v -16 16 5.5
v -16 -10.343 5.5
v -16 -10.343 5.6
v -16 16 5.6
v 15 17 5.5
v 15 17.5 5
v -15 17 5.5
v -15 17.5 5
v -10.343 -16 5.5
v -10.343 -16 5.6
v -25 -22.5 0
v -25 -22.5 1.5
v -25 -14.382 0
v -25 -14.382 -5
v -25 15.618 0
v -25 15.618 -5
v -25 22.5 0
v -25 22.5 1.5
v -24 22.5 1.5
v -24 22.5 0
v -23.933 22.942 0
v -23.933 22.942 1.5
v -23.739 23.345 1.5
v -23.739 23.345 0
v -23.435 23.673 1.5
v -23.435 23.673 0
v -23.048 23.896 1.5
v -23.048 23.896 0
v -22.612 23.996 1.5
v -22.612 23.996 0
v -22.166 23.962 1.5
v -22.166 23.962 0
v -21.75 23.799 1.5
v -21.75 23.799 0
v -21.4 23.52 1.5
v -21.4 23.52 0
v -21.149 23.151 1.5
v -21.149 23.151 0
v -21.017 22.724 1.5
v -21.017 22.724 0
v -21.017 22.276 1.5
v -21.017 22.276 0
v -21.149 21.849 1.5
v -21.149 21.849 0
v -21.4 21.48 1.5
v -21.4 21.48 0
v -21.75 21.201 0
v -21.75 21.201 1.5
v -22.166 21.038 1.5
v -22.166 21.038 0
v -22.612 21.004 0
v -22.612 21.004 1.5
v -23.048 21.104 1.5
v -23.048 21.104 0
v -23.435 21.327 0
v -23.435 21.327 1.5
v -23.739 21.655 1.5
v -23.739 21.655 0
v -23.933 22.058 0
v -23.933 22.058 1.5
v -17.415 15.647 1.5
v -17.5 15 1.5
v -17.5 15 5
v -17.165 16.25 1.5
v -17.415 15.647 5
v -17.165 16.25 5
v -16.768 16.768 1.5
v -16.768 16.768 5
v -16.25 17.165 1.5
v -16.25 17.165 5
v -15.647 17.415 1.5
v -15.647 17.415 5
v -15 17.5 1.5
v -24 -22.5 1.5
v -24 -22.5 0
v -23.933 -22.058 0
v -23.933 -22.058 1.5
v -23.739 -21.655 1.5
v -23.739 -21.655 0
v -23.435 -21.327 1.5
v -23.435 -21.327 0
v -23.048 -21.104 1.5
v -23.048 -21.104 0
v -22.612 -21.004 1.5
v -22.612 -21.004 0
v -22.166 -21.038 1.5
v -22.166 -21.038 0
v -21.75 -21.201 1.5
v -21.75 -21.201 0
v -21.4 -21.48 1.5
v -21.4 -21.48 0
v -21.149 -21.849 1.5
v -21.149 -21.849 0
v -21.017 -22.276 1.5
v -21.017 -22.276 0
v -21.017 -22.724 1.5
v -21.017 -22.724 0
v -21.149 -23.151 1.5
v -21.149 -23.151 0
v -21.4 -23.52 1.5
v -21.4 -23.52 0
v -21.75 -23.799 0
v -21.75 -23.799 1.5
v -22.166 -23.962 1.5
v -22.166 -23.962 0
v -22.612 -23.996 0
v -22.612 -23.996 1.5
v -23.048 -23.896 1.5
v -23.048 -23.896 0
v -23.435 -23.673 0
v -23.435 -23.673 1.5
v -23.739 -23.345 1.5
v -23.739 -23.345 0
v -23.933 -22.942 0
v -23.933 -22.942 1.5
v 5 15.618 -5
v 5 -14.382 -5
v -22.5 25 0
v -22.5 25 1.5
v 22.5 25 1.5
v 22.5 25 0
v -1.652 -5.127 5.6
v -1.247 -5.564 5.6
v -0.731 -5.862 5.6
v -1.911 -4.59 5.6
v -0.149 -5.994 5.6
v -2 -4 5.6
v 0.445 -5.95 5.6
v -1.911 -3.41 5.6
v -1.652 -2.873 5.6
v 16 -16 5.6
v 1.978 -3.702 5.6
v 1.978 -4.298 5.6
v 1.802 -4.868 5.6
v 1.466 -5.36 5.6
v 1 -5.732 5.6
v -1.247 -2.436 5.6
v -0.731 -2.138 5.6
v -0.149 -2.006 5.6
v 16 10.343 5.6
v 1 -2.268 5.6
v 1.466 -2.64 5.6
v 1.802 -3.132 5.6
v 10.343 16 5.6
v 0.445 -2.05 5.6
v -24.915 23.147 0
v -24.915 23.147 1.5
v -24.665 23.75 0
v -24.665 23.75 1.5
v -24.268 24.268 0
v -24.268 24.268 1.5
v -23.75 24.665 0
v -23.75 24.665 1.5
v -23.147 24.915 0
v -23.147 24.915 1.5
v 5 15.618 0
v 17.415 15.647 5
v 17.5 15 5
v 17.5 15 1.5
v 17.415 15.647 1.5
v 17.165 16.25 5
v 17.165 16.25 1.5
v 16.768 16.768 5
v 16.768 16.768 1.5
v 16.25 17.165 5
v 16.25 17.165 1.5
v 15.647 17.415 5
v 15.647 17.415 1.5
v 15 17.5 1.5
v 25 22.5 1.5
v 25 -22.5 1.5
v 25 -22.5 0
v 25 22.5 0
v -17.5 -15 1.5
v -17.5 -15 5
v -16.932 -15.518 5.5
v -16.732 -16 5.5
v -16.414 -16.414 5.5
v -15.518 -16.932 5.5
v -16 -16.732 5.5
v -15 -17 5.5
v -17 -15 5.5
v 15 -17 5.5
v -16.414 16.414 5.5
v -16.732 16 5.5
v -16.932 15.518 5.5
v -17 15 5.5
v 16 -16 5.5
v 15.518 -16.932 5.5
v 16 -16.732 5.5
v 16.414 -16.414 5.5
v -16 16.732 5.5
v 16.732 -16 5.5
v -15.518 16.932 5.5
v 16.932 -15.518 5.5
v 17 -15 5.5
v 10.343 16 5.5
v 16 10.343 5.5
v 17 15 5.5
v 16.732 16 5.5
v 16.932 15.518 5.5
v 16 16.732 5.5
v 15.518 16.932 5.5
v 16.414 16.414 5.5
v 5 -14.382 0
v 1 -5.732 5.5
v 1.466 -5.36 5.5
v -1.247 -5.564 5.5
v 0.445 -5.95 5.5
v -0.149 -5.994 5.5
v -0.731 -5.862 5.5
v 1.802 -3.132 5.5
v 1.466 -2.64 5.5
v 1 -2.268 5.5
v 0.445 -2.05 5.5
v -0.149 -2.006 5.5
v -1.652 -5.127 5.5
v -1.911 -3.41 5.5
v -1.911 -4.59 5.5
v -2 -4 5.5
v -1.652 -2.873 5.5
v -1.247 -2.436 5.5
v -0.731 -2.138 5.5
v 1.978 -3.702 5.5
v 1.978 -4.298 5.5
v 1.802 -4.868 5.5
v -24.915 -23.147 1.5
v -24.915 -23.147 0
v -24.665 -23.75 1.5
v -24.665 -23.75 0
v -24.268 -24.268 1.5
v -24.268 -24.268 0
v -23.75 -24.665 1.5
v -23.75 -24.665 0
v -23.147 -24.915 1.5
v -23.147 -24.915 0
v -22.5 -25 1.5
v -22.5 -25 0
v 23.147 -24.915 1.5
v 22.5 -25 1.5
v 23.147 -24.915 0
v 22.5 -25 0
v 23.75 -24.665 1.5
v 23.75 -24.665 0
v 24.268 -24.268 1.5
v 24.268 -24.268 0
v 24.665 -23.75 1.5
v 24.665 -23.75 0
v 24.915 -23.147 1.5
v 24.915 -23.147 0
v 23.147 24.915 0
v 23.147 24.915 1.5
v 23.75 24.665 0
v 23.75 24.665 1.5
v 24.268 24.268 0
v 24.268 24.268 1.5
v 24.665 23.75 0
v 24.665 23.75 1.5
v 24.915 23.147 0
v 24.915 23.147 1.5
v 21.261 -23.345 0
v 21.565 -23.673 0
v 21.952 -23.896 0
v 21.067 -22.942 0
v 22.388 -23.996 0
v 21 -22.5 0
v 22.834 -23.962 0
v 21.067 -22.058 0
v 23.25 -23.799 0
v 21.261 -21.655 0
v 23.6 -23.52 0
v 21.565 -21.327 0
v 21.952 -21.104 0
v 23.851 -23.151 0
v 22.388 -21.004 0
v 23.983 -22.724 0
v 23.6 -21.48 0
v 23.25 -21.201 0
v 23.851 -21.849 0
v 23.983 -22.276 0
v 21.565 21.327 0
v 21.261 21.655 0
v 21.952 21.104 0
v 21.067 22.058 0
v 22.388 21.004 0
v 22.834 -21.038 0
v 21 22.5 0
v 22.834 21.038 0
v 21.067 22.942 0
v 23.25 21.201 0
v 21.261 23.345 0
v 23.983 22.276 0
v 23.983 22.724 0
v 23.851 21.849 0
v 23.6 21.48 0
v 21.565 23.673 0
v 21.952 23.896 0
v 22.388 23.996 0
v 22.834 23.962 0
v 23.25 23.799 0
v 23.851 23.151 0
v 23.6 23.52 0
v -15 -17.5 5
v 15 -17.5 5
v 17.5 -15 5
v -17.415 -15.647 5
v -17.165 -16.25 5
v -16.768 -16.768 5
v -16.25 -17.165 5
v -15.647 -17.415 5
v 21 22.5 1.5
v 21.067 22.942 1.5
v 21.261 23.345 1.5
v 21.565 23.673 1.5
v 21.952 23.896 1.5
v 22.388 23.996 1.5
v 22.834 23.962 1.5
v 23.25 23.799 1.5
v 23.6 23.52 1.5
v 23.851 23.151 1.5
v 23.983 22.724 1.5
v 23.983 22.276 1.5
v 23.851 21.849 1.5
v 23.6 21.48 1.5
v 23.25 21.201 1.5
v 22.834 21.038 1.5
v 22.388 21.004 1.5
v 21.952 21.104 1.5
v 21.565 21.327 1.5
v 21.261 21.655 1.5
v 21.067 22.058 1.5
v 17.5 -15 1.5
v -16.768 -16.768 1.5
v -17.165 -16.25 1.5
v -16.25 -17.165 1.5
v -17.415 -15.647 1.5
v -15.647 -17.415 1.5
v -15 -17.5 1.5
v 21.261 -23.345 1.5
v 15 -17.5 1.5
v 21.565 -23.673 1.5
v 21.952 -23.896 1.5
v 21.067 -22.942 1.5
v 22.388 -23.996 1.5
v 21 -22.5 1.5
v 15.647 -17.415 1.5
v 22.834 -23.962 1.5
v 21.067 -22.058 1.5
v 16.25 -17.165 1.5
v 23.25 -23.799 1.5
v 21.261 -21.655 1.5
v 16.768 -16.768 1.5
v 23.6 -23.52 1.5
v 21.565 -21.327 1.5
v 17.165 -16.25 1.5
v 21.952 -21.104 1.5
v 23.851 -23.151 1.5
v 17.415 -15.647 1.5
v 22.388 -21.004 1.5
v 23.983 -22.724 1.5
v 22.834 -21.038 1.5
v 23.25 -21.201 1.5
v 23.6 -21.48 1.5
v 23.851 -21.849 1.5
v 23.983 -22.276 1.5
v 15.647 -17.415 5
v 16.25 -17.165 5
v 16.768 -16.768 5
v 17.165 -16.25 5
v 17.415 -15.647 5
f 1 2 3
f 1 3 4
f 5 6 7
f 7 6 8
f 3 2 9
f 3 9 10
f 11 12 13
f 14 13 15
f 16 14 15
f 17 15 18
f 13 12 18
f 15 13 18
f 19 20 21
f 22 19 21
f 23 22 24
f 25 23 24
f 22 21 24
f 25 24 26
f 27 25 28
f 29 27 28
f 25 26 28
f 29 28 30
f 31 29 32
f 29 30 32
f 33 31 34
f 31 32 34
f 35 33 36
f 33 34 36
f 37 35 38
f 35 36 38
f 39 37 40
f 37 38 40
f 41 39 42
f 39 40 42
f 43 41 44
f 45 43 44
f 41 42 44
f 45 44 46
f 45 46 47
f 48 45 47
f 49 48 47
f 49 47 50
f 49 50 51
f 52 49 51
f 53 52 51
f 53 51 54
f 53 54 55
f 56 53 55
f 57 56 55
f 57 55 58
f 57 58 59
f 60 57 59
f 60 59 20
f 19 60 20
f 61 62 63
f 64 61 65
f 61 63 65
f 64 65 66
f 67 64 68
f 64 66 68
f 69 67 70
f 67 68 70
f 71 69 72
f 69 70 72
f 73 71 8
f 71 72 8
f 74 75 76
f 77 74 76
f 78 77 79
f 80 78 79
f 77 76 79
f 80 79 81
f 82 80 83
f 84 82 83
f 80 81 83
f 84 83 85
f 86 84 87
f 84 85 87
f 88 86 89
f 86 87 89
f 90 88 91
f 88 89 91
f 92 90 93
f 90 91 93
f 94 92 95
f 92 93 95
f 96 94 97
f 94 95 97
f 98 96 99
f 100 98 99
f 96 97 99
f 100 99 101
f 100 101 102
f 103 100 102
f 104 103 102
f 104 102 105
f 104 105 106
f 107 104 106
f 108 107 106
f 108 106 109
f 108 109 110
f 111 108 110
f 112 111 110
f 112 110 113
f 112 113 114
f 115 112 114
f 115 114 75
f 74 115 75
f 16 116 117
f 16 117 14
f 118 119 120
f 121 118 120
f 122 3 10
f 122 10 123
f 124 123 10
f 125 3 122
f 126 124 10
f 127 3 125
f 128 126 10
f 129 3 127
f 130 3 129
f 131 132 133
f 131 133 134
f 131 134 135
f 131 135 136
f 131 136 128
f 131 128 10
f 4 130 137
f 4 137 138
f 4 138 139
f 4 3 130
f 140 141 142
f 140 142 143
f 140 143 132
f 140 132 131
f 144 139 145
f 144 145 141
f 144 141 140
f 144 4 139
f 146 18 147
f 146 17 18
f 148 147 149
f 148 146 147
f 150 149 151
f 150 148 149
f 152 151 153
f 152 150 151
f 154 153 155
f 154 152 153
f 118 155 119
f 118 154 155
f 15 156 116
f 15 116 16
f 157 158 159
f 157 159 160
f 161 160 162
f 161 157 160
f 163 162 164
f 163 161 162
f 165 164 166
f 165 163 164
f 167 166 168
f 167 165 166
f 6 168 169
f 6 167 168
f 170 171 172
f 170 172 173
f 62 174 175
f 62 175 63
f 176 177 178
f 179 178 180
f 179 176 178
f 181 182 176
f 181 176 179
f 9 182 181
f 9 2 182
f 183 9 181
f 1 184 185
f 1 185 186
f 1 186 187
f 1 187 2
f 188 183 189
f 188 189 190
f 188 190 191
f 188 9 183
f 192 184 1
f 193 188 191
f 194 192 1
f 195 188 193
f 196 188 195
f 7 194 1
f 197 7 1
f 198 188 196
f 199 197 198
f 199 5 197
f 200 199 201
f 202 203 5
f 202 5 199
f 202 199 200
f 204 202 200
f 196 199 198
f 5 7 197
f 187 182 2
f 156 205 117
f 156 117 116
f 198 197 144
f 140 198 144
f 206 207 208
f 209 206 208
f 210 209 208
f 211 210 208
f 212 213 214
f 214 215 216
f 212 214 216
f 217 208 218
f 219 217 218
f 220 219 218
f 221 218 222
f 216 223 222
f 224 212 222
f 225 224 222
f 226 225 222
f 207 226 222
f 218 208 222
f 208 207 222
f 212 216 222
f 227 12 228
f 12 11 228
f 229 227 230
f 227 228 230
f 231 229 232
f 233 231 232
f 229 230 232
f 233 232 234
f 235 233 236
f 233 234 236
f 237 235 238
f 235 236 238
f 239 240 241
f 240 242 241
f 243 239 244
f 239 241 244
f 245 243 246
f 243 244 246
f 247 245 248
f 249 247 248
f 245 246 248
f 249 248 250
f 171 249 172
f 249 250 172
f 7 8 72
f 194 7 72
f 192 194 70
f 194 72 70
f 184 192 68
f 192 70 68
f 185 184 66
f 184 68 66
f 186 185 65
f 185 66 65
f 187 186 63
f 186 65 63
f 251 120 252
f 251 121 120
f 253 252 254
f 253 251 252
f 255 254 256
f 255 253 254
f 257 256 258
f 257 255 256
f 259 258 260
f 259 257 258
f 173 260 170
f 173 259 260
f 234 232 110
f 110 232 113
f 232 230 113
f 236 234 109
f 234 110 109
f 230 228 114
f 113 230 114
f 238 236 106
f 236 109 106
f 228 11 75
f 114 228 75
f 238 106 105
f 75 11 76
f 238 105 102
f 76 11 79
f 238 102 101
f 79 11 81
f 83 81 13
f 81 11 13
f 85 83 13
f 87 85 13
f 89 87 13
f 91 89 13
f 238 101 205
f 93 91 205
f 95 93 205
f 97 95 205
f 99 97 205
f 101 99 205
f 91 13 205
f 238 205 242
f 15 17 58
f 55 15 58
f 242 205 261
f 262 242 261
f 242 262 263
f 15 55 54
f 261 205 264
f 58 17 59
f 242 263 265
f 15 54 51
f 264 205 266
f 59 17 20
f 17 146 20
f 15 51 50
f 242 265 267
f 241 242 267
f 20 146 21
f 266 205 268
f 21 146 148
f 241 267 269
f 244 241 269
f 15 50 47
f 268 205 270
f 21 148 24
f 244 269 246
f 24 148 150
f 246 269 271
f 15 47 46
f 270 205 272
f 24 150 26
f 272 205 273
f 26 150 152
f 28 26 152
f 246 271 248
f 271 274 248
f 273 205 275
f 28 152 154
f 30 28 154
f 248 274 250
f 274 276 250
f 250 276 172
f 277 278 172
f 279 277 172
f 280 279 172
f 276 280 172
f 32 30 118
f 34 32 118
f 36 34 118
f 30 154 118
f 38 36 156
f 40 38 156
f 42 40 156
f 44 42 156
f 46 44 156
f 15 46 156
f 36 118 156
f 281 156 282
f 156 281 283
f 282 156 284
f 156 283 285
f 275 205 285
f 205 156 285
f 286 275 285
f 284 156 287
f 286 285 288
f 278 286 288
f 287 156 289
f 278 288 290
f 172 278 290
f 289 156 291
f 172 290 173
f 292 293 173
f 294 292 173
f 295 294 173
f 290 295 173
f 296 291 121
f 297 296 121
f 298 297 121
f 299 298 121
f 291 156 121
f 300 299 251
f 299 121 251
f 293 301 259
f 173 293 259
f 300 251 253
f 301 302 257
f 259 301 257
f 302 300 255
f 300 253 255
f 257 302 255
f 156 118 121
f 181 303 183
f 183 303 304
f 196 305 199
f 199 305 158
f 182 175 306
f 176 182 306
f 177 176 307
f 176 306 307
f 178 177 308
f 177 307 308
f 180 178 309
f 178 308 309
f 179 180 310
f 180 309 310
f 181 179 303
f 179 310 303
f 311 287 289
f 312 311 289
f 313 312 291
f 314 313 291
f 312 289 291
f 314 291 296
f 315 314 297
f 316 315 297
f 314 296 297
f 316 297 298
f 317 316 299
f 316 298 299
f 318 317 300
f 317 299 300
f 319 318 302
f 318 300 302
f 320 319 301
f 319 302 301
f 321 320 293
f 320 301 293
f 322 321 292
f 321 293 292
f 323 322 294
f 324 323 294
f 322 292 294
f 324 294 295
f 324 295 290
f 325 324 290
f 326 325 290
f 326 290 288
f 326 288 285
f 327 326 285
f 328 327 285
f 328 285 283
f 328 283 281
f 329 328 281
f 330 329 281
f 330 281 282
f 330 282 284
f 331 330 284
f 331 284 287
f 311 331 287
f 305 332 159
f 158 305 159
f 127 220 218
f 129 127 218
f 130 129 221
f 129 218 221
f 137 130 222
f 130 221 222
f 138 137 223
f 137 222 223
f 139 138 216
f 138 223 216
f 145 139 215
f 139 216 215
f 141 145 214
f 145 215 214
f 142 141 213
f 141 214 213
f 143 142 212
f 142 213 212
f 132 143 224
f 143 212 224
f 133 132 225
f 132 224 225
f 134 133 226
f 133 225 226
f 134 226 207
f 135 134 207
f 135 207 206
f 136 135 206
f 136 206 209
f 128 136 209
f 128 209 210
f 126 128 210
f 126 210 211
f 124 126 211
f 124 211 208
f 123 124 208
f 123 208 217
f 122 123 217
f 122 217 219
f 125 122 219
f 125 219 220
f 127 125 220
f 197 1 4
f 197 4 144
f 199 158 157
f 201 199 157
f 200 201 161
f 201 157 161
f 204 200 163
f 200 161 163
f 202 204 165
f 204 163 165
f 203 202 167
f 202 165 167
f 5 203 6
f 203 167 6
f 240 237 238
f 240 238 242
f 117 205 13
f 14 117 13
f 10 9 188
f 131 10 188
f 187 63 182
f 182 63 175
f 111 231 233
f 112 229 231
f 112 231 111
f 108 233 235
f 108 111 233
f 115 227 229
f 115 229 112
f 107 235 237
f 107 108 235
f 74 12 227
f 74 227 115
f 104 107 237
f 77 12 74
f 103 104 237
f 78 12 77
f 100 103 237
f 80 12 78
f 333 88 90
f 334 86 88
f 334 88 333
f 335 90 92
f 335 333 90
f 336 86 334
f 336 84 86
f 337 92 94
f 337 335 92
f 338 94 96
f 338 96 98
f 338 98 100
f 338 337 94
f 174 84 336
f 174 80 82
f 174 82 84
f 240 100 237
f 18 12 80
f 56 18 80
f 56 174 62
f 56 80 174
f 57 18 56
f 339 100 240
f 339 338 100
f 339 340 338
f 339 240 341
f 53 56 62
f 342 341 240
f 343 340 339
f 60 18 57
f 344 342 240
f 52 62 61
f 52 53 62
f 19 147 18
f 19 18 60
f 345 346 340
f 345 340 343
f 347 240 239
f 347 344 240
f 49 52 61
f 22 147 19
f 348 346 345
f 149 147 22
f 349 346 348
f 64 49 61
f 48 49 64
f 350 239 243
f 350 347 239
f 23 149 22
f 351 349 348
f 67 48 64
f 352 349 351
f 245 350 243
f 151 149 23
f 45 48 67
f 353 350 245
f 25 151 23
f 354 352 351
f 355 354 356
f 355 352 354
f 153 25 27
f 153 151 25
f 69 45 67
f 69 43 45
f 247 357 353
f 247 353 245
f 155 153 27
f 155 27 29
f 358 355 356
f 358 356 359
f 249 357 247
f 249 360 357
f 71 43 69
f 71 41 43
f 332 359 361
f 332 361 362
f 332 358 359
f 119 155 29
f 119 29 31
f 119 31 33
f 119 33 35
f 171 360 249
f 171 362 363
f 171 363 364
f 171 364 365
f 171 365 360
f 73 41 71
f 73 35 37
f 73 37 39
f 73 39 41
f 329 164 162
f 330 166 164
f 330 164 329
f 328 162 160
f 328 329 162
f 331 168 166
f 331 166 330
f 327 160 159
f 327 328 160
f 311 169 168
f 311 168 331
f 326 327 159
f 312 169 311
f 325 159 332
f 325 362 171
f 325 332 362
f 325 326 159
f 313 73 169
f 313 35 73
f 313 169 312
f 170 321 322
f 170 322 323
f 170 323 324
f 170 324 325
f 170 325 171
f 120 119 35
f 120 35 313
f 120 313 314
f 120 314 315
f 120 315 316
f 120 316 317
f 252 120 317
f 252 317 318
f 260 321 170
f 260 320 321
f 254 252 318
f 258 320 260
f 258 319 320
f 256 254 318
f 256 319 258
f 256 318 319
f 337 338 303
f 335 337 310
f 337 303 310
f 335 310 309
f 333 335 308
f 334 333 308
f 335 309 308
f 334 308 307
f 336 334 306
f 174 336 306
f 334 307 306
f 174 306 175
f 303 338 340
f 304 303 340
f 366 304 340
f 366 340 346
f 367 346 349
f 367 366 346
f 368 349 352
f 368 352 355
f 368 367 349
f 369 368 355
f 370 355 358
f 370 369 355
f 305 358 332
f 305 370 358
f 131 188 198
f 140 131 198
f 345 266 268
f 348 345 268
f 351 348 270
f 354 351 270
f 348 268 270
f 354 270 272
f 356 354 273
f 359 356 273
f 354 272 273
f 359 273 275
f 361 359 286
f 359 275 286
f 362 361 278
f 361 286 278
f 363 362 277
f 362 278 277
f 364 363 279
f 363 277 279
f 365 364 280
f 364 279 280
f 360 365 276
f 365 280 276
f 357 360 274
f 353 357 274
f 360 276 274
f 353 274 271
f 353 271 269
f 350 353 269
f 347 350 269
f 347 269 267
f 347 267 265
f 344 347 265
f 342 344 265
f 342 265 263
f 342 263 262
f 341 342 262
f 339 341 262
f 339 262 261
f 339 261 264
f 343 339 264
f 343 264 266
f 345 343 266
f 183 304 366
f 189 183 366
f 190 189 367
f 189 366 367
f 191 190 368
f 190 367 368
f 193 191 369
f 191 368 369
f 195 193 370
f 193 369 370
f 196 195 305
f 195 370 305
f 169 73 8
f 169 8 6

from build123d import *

# Parameters (mm, degrees)
SKETCH1_W                    = 50
SKETCH1_H                    = 50
BOSS_EXTRUDE1_DEPTH          = 1.5
SKETCH2_W                    = 35
SKETCH2_H                    = 35
BOSS_EXTRUDE2_DEPTH          = 4
SKETCH3_W                    = 32
SKETCH3_H                    = 32
BOSS_EXTRUDE3_DEPTH          = 0.1
F_3_0_3_DIAMETER_HOLE1_D     = 3
F_4_0_4_DIAMETER_HOLE1_D     = 4
F_4_0_4_DIAMETER_HOLE1_DEPTH = 0.1
FILLET1_R                    = 2.5
CHAMFER1_SIZE                = 5.656854249
CHAMFER2_SIZE                = 0.5
SKETCH8_W                    = 30
SKETCH8_H                    = 30
BOSS_EXTRUDE4_DEPTH          = 5


with BuildPart() as part:
    # Sketch1 → Boss-Extrude1 (new body)
    with BuildSketch(Plane.XY.offset(1.5)):
        Rectangle(SKETCH1_W, SKETCH1_H)
    extrude(amount=-BOSS_EXTRUDE1_DEPTH)

    # Sketch2 → Boss-Extrude2 (add)
    with BuildSketch(Plane.XY.offset(1.5)):
        Rectangle(SKETCH2_W, SKETCH2_H)
    extrude(amount=BOSS_EXTRUDE2_DEPTH)

    # Sketch3 → Boss-Extrude3 (add)
    with BuildSketch(Plane.XY.offset(5.5)):
        Rectangle(SKETCH3_W, SKETCH3_H)
    extrude(amount=BOSS_EXTRUDE3_DEPTH)

    # Ø3.0 (3) Diameter Hole1 (through all)
    with Locations(Plane.XY.offset(1.5)):
        with Locations((22.5, -22.5), (-22.5, 22.5), (22.5, 22.5), (-22.5, -22.5)):
            Hole(F_3_0_3_DIAMETER_HOLE1_D / 2)

    # Ø4.0 (4) Diameter Hole1
    with Locations(Plane.XY.offset(5.6)):
        with Locations((0, -4)):
            Hole(F_4_0_4_DIAMETER_HOLE1_D / 2, depth=F_4_0_4_DIAMETER_HOLE1_DEPTH)

    # Fillet1
    fillet1_edges = [part.edges().sort_by_distance(p)[0] for p in [
        (-17.5, 17.5, 3.5),
        (-17.5, -17.5, 3.5),
        (17.5, -17.5, 3.5),
        (17.5, 17.5, 3.5),
        (25, -25, 0.75),
        (-25, -25, 0.75),
        (-25, 25, 0.75),
        (25, 25, 0.75),
    ]]
    fillet(fillet1_edges, radius=FILLET1_R)

    # Chamfer1
    chamfer1_edges = [part.edges().sort_by_distance(p)[0] for p in [
        (16, 16, 5.55),
        (-16, -16, 5.55),
    ]]
    chamfer(chamfer1_edges, length=CHAMFER1_SIZE)

    # Chamfer2
    chamfer2_edges = [part.edges().sort_by_distance(p)[0] for p in [
        (17.5, 0, 5.5),
        (0, -17.5, 5.5),
        (-17.5, 0, 5.5),
        (0, 17.5, 5.5),
        (-16.767766953, 16.767766953, 5.5),
        (-16.767766953, -16.767766953, 5.5),
        (16.767766953, 16.767766953, 5.5),
        (16.767766953, -16.767766953, 5.5),
    ]]
    chamfer(chamfer2_edges, length=CHAMFER2_SIZE)

    # Sketch8 → Boss-Extrude4 (add)
    with BuildSketch(Plane(origin=(0, 0, 0), x_dir=(-1, 0, 0), z_dir=(0, 0, -1))):
        with Locations((10, 0.618109873)):
            Rectangle(SKETCH8_W, SKETCH8_H)
    extrude(amount=BOSS_EXTRUDE4_DEPTH)


solid = part.part
